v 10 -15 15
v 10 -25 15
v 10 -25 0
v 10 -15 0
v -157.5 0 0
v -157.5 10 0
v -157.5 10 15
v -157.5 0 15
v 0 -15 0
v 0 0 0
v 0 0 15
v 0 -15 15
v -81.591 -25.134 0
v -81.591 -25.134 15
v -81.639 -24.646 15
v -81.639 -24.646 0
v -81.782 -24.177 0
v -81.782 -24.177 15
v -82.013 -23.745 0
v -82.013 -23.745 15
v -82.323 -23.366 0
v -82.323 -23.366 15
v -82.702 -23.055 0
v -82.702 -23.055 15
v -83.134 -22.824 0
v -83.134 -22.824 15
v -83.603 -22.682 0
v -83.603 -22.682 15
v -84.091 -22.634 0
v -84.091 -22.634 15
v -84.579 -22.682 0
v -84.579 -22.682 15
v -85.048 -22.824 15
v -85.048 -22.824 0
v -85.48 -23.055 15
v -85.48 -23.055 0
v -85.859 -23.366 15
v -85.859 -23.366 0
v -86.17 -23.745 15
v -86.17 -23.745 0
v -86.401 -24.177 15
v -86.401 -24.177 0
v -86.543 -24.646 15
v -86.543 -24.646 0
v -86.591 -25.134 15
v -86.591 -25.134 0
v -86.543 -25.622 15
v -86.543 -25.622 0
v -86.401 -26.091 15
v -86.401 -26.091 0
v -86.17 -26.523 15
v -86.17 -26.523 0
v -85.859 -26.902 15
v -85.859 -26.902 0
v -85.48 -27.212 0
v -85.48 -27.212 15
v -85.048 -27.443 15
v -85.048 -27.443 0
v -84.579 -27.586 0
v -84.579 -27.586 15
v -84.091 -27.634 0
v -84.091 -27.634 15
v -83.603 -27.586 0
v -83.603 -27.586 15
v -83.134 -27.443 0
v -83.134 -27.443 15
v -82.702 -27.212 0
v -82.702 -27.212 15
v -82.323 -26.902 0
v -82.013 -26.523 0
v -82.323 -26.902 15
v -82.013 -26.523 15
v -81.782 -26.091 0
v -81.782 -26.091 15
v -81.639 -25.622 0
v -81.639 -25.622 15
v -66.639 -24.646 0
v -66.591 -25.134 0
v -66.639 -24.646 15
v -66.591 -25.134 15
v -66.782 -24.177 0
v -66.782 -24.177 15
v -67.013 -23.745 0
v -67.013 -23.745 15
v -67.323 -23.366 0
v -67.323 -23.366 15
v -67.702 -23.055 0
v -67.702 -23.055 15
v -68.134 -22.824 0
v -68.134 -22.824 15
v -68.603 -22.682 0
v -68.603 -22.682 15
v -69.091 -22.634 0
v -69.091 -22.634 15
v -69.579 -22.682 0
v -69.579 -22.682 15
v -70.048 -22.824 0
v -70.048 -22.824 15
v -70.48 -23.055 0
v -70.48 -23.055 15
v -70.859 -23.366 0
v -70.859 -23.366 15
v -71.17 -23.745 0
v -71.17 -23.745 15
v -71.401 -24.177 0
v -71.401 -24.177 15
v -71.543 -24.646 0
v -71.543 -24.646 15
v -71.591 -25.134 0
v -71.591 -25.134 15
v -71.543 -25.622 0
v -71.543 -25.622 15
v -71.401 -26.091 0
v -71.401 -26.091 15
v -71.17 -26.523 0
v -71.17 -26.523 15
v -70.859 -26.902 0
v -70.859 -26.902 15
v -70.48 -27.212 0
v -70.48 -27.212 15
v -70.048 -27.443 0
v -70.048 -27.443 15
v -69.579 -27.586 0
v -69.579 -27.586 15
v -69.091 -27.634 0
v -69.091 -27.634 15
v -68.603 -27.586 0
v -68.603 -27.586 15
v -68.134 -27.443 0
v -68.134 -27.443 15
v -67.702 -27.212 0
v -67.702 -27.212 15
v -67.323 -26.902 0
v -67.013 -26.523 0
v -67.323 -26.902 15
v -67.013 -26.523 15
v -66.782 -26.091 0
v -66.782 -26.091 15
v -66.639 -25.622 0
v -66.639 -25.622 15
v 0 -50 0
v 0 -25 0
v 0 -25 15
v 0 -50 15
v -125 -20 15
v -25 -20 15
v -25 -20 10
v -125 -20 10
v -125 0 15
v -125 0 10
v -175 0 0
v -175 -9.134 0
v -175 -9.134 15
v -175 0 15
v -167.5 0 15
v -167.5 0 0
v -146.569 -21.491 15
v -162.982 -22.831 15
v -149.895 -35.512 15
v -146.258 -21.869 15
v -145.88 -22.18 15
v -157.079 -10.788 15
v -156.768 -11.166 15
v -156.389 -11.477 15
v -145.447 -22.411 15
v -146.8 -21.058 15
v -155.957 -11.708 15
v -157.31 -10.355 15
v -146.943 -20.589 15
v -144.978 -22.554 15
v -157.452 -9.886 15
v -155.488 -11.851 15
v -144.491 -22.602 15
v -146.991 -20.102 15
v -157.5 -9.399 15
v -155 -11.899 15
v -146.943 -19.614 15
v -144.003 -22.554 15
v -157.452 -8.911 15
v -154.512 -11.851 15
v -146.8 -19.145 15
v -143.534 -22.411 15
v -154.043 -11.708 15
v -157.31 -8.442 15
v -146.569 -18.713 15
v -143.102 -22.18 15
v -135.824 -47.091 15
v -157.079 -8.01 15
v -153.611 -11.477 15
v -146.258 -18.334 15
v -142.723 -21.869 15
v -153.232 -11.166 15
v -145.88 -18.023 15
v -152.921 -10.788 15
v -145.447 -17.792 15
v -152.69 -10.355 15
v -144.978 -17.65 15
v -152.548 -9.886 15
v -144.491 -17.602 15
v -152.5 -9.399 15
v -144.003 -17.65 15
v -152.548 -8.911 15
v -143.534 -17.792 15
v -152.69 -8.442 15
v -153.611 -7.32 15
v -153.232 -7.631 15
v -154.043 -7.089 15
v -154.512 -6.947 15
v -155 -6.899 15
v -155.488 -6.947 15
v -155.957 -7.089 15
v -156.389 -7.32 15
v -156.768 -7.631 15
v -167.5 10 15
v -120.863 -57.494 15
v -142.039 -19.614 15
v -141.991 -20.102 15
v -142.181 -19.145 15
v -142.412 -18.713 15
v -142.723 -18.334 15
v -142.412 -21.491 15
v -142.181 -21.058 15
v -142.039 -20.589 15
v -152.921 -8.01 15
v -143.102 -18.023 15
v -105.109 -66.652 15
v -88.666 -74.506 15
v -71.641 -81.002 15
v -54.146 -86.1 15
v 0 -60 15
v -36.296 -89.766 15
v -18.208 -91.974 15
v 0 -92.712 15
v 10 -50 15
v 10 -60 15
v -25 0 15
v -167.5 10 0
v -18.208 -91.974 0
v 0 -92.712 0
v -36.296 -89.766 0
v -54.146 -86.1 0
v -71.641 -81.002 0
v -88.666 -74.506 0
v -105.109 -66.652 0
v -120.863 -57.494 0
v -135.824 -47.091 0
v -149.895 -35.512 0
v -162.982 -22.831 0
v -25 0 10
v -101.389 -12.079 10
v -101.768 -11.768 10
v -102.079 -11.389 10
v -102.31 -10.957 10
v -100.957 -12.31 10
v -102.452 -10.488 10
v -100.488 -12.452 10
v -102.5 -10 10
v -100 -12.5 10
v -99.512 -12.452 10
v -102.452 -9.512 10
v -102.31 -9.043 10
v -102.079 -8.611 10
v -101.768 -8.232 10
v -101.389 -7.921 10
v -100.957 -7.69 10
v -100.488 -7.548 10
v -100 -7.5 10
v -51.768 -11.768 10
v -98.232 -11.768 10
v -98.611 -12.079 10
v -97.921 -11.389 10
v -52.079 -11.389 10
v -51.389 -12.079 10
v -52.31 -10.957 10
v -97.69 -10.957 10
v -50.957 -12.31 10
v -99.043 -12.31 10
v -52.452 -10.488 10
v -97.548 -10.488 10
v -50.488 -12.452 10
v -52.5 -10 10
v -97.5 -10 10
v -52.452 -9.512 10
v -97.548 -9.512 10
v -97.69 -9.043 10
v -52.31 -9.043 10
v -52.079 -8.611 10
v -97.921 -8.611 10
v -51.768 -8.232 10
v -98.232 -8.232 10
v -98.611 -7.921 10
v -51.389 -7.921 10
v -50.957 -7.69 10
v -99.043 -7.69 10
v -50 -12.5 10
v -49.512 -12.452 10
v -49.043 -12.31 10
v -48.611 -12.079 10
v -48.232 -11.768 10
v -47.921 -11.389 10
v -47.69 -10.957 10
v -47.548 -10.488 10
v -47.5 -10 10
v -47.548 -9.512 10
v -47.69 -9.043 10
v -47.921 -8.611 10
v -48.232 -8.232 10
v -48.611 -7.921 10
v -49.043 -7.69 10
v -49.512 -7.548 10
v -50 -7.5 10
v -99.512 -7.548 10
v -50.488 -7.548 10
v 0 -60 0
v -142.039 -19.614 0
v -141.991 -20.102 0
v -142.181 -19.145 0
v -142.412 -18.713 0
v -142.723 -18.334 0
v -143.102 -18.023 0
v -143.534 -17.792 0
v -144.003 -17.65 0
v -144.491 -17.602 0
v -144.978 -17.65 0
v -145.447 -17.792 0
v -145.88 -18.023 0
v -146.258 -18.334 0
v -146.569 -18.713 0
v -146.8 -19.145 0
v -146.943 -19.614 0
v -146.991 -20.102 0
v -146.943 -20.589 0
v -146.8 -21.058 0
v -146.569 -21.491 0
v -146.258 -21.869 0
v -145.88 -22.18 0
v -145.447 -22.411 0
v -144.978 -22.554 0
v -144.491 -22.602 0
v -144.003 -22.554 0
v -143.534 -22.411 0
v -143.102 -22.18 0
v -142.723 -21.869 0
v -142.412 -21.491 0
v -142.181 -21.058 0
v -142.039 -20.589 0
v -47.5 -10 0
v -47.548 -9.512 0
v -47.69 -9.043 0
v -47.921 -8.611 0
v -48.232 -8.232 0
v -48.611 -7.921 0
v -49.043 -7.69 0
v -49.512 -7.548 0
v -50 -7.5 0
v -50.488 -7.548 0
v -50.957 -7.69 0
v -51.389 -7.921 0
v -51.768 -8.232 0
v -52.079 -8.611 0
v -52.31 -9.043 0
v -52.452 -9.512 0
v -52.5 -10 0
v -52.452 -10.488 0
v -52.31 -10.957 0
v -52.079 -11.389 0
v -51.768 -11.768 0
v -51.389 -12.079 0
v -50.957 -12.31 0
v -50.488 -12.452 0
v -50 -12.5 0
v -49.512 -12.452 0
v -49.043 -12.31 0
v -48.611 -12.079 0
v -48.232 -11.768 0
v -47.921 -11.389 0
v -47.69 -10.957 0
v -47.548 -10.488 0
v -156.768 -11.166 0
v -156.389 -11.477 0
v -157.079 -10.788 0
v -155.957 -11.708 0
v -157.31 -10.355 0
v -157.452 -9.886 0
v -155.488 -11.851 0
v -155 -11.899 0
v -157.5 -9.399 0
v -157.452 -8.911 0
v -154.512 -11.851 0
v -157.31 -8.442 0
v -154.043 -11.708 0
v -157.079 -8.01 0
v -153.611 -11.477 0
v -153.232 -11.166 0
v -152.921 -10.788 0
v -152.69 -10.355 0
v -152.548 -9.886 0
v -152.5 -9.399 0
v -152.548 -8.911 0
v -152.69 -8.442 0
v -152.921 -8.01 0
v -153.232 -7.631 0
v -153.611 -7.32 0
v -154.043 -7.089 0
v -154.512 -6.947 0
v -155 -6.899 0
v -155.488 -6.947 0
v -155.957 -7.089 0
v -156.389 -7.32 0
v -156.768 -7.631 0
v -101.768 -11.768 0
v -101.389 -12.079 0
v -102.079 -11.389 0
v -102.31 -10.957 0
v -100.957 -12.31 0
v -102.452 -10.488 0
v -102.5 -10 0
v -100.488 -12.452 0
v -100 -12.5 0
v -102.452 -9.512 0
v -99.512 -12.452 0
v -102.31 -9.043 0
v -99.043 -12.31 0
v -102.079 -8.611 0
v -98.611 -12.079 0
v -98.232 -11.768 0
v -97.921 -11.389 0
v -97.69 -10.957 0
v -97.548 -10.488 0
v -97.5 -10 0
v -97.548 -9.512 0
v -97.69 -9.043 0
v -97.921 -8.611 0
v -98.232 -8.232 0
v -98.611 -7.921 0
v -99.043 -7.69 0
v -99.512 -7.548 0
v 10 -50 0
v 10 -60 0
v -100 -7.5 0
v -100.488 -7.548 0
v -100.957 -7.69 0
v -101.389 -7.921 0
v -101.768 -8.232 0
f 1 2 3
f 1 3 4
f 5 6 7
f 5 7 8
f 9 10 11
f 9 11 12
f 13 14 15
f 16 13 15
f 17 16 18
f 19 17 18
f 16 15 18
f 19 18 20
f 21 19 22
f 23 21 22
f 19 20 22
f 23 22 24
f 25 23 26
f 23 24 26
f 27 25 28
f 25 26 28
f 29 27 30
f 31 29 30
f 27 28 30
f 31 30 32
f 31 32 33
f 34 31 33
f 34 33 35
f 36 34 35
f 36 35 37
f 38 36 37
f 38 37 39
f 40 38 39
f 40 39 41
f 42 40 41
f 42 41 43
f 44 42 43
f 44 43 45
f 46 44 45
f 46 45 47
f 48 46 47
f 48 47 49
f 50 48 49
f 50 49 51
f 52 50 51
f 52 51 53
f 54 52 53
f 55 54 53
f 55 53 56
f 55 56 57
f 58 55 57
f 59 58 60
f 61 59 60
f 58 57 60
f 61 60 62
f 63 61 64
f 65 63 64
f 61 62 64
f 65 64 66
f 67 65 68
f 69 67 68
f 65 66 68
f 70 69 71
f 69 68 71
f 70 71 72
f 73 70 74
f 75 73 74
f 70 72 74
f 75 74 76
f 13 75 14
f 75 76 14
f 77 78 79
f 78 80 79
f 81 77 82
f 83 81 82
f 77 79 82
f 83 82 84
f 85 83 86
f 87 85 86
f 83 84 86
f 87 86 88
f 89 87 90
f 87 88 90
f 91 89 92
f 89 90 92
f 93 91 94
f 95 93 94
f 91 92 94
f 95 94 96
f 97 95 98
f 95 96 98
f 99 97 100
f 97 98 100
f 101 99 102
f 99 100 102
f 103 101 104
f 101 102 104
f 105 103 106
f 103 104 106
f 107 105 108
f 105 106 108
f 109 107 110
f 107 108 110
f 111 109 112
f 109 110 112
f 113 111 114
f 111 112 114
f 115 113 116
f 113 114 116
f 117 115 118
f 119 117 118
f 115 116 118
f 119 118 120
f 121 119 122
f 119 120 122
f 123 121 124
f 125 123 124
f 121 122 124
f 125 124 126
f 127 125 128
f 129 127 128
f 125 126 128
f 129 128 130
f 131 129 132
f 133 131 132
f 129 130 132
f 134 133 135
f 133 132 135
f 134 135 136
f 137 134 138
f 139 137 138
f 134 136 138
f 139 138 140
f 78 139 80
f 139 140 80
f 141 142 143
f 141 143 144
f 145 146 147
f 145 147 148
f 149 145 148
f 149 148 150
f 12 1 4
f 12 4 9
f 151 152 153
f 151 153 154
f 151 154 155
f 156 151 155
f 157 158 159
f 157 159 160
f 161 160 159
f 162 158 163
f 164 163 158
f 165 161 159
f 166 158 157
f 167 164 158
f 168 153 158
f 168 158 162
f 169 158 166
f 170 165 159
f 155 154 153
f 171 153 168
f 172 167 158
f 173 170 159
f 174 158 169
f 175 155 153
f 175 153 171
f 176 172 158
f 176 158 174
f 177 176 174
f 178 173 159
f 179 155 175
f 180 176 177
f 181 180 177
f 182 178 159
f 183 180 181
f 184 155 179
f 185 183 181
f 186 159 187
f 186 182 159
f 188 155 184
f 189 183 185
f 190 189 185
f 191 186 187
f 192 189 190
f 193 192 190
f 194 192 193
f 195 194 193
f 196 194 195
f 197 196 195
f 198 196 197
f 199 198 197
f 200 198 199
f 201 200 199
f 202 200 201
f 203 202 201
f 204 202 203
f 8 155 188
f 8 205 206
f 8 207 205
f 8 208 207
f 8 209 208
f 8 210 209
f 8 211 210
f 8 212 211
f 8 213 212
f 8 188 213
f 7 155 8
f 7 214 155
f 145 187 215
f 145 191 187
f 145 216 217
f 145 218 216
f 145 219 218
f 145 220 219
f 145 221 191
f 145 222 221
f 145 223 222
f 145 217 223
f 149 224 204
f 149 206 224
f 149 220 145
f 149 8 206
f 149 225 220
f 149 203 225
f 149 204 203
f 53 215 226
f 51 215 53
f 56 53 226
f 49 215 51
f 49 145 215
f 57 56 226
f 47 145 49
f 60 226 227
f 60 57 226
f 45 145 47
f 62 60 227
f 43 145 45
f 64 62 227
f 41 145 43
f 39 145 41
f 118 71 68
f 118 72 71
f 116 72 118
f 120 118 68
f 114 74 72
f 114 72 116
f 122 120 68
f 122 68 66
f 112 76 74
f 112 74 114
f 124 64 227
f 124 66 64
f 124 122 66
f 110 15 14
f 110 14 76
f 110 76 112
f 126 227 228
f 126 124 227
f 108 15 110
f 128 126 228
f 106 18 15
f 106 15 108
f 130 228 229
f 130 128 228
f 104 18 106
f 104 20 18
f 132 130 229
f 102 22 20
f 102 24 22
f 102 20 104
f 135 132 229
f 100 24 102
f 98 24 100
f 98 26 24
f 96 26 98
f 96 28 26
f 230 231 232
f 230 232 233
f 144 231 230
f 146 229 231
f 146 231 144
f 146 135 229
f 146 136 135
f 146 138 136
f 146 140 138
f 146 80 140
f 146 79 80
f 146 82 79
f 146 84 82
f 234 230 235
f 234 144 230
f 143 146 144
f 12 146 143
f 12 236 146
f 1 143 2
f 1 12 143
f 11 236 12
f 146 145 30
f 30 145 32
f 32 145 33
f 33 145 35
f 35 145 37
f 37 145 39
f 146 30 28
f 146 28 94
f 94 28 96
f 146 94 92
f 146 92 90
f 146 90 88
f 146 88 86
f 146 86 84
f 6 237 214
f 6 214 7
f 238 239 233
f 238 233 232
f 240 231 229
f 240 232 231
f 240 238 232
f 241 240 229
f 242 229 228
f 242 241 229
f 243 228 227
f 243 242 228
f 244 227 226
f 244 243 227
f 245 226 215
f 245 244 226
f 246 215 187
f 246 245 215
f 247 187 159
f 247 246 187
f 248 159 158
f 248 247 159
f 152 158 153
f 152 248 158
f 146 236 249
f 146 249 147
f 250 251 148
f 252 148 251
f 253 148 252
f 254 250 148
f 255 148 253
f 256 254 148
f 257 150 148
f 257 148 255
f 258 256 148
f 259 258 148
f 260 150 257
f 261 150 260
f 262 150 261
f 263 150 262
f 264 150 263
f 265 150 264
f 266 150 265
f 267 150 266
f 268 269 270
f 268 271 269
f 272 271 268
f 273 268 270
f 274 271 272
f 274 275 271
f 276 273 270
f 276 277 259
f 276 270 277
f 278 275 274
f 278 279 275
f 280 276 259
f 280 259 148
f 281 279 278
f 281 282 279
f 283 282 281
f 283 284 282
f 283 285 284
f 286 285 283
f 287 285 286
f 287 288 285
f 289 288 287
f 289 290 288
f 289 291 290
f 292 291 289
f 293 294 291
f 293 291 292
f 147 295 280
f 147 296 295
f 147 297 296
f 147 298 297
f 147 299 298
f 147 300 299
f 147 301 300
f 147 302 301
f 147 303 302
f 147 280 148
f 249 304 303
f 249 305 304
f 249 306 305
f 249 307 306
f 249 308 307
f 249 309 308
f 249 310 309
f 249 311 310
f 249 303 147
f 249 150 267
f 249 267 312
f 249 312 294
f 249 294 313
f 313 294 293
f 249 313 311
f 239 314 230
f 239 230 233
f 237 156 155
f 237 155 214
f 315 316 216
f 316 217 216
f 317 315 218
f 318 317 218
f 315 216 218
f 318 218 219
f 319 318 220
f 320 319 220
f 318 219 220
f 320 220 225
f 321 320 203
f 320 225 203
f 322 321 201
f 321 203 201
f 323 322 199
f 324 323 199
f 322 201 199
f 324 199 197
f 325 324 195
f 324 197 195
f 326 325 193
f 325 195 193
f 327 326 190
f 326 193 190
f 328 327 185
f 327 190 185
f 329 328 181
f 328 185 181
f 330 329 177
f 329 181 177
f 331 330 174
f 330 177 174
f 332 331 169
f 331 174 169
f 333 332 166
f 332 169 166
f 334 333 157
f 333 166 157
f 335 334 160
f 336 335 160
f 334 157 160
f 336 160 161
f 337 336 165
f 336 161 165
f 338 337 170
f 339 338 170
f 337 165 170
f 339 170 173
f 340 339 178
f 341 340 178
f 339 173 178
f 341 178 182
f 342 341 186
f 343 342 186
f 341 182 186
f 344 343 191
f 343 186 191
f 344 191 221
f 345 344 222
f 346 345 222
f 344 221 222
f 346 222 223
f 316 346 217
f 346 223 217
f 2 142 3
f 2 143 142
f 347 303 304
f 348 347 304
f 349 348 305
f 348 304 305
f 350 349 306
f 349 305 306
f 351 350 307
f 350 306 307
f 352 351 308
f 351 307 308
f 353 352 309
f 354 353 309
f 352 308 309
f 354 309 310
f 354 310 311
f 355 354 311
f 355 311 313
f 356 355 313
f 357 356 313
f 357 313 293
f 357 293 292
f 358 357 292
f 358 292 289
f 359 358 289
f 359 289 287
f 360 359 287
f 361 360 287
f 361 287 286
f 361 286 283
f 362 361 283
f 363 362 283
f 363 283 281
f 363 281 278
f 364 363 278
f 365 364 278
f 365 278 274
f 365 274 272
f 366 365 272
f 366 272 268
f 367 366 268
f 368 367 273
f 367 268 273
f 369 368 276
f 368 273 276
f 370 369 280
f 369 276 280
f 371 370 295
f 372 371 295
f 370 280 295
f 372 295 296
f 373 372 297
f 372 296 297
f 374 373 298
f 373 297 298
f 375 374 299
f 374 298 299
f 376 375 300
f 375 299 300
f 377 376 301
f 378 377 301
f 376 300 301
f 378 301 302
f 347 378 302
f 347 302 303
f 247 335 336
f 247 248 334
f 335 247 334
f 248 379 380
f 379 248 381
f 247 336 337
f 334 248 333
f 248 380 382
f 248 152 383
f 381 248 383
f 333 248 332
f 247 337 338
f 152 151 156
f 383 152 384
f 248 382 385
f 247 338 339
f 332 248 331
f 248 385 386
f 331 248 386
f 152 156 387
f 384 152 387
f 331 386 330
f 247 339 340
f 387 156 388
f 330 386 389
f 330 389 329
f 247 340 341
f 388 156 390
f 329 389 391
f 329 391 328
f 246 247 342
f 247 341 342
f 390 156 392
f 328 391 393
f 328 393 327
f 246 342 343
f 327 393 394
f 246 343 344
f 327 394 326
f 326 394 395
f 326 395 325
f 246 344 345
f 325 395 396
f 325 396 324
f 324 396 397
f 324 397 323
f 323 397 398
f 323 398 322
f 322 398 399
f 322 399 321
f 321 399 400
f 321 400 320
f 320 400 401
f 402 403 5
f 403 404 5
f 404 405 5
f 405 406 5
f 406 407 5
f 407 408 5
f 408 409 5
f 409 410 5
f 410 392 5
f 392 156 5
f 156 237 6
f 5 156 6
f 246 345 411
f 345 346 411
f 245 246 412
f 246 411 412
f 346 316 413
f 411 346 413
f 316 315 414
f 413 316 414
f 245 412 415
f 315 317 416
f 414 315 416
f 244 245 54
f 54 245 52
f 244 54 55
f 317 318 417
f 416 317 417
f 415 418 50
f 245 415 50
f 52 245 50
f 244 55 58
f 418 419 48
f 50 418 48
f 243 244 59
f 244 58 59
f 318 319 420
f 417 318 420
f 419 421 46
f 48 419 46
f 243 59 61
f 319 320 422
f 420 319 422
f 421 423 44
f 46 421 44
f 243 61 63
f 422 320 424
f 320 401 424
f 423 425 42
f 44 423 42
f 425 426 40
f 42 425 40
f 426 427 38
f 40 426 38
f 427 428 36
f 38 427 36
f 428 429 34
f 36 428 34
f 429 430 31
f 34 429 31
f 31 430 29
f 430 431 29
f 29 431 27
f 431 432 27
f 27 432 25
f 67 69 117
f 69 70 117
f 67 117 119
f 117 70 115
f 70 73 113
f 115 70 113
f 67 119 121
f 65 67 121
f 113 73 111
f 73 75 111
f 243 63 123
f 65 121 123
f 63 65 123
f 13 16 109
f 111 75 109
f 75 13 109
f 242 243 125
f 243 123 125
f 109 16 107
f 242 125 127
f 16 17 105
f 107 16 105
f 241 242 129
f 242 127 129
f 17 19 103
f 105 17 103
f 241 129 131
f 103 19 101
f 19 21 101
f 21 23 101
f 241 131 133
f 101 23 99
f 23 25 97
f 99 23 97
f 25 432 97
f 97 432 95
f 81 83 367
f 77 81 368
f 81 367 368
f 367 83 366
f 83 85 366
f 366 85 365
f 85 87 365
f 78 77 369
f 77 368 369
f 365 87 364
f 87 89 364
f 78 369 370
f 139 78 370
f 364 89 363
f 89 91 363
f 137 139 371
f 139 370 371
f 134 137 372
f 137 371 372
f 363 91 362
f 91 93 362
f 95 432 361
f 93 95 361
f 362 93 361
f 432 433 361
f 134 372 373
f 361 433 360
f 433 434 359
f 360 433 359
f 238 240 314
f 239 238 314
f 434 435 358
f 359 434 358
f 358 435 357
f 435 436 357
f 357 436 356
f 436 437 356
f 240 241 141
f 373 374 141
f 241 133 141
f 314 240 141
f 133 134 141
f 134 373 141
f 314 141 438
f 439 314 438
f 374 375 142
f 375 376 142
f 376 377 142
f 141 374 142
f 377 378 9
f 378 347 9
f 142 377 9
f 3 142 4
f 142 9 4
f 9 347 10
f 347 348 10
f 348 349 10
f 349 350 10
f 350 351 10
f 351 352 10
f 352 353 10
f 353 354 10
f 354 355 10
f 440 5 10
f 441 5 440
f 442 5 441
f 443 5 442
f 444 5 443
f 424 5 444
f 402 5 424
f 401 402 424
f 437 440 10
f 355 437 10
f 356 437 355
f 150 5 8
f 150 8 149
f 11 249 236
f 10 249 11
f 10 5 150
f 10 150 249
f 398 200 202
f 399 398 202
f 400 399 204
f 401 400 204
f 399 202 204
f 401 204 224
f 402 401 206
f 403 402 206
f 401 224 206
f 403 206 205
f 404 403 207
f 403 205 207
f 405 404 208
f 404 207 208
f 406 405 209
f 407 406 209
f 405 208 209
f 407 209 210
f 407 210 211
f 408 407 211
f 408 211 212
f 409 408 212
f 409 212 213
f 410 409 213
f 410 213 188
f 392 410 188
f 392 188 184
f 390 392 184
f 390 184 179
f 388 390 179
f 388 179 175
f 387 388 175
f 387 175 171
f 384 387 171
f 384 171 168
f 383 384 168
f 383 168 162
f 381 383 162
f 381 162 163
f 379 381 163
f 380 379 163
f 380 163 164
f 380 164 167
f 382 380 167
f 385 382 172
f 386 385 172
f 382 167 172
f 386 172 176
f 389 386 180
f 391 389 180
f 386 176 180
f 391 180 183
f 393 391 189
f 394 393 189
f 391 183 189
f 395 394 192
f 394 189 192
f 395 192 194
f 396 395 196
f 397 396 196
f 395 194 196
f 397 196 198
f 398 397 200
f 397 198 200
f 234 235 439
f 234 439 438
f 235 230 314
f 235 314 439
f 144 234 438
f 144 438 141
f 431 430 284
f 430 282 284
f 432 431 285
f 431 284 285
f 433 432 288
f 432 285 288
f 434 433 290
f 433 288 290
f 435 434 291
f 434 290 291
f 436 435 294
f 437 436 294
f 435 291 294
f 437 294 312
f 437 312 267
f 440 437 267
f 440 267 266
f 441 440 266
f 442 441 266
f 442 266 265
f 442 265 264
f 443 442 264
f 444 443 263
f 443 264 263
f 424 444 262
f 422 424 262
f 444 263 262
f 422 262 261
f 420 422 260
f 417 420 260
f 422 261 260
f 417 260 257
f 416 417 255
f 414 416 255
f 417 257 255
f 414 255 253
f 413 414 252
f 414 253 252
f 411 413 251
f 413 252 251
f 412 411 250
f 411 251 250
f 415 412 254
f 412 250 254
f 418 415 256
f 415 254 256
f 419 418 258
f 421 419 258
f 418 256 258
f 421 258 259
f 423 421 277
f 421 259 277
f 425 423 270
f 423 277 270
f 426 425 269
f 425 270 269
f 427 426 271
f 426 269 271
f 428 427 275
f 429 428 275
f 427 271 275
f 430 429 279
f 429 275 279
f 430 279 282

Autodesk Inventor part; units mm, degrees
ref_plane "YZ Plane" through (0, 0, 0) normal (1, 0, 0) x (0, 1, 0)
ref_plane "XZ Plane" through (0, 0, 0) normal (0, 1, 0) x (-1, 0, 0)
ref_plane "XY Plane" through (0, 0, 0) normal (0, 0, 1) x (1, 0, 0)
sketch "Sketch1" plane through (0, 0, 0) normal (0, 0, 1) x (1, 0, 0)
  circle A0 centre (0, 132.2876) radius 225 construction
  circle A1 centre (0, 132.2876) radius 200 construction
  line L0 (-225, 132.2876) -> (-150, 132.2876) construction
  line L1 (-150, 132.2876) -> (-150, -35.4175) construction
  line L2 (-175, 132.2876) -> (-175, -9.1338) construction
  line L3 (0, 132.2876) -> (0, -92.7124) construction
  line L4 (-150, 0) -> (0, 0)
  line L5 (-175, -9.1338) -> (-175, 0)
  line L6 (0, 0) -> (0, -92.7124)
  arc A2 (-175, -9.1338) -> (0, -92.7124) centre (0, 132.2876) ccw
  line L7 (-167.5, 0) -> (-167.5, 10)
  line L8 (-167.5, 10) -> (-157.5, 10)
  line L9 (-157.5, 10) -> (-157.5, 0)
  line L10 (-175, 0) -> (-167.5, 0)
  line L11 (-157.5, 0) -> (-150, 0)
  dimension "d0" = 450
  dimension "d1" = 25
  dimension "d2" = 75
  dimension "d3" = 25
  dimension "d14" = 10
  dimension "d15" = 10
  dimension "d16" = 90
  dimension "d17" = 7.5
extrude "Extrusion1" add sketch "Sketch1" along normal blind 15
sketch "Sketch2" plane through (0, 0, 15) normal (0, 0, 1) x (1, 0, 0)
  line L0 (10, -15) -> (0, -15)
  line L1 (0, -15) -> (0, -25)
  line L2 (0, -25) -> (10, -25)
  line L3 (10, -25) -> (10, -15)
  line L4 (10, -50) -> (0, -50)
  line L5 (0, -50) -> (0, -60)
  line L6 (0, -60) -> (10, -60)
  line L7 (10, -60) -> (10, -50)
  line L8 (0, 0) -> (0, -95.6231) construction
  line L9 (0, -92.7124) -> (0, 0) construction
  dimension "d6" = 10
  dimension "d7" = 10
  dimension "d8" = 10
  dimension "d9" = 10
  dimension "d10" = 15
  dimension "d11" = 25
extrude "Extrusion2" add sketch "Sketch2" against normal blind 15
sketch "Sketch3" plane through (0, 0, 15) normal (0, 0, 1) x (1, 0, 0)
  line L0 (-25, 0) -> (-125, 0) construction
  line L1 (-125, 0) -> (-125, -20) construction
  line L2 (-125, -20) -> (-25, -20) construction
  line L3 (-25, -20) -> (-25, 0) construction
  line L4 (0, 0) -> (-157.5, 0) construction
  circle A0 centre (-100, -10) radius 2.5
  circle A1 centre (-50, -10) radius 2.5
  dimension "d18" = 100
  dimension "d19" = 20
  dimension "d20" = 25
  dimension "d21" = 5
  dimension "d22" = 5
  dimension "d23" = 25
  dimension "d24" = 25
extrude "Extrusion3" cut sketch "Sketch3" against normal through all
thread "Thread1" size "M5x0.8" class "6H" standard "ANSI Metric M Profile" full length
thread "Thread2" size "M5x0.8" class "6H" standard "ANSI Metric M Profile" full length
sketch "Sketch5" plane through (0, 0, 15) normal (0, 0, 1) x (1, 0, 0)
  line L0 (-125, 0) -> (-25, 0)
  line L1 (-25, 0) -> (-25, -20)
  line L2 (-25, -20) -> (-125, -20)
  line L3 (-125, -20) -> (-125, 0)
  point P0 (0, 0)
  dimension "d31" = 100
  dimension "d32" = 20
  dimension "d33" = 25
extrude "Extrusion4" cut sketch "Sketch5" against normal blind 5
sketch "Sketch6" plane through (0, 0, 15) normal (0, 0, 1) x (1, 0, 0)
  circle A0 centre (0, 132.2876) radius 225 construction
  arc A1 (-175, -9.1338) -> (0, -92.7124) centre (0, 132.2876) ccw construction
  circle A2 centre (0, 132.2876) radius 210 construction
  circle A3 centre (-155, -9.3987) radius 2.5
  circle A4 centre (-144.4906, -20.1016) radius 2.5
  line L0 (-175, 0) -> (-175, -9.1338) projected
  point P0 (0, 0)
  dimension "d36" = 450
  dimension "d37" = 15
  dimension "d38" = 5
  dimension "d39" = 5
  dimension "d40" = 15
  dimension "d41" = 20
extrude "Extrusion5" cut sketch "Sketch6" against normal through all
thread "Thread3" size "M5x0.8" class "6H" standard "ANSI Metric M Profile" full length
thread "Thread4" size "M5x0.8" class "6H" standard "ANSI Metric M Profile" full length
sketch "Sketch7" plane through (0, 0, 15) normal (0, 0, 1) x (1, 0, 0)
  circle A0 centre (-84.0912, -25.1338) radius 2.5
  circle A1 centre (-69.0912, -25.1338) radius 2.5
  line L0 (-125, 0) -> (-25, 0) projected
  line L1 (-175, 0) -> (-175, -9.1338) construction
  line L2 (-175, -9.1338) -> (22.4277, -9.1338) construction
  point P0 (0, 0)
  dimension "d48" = 5
  dimension "d49" = 5
  dimension "d50" = 69.0912
  dimension "d51" = 15
  dimension "d53" = 16
extrude "Extrusion6" cut sketch "Sketch7" against normal through all
thread "Thread5" size "M5x0.8" class "6H" standard "ANSI Metric M Profile" full length
thread "Thread6" size "M5x0.8" class "6H" standard "ANSI Metric M Profile" full length
properties part number "CP004" material "ABS Plastic"
